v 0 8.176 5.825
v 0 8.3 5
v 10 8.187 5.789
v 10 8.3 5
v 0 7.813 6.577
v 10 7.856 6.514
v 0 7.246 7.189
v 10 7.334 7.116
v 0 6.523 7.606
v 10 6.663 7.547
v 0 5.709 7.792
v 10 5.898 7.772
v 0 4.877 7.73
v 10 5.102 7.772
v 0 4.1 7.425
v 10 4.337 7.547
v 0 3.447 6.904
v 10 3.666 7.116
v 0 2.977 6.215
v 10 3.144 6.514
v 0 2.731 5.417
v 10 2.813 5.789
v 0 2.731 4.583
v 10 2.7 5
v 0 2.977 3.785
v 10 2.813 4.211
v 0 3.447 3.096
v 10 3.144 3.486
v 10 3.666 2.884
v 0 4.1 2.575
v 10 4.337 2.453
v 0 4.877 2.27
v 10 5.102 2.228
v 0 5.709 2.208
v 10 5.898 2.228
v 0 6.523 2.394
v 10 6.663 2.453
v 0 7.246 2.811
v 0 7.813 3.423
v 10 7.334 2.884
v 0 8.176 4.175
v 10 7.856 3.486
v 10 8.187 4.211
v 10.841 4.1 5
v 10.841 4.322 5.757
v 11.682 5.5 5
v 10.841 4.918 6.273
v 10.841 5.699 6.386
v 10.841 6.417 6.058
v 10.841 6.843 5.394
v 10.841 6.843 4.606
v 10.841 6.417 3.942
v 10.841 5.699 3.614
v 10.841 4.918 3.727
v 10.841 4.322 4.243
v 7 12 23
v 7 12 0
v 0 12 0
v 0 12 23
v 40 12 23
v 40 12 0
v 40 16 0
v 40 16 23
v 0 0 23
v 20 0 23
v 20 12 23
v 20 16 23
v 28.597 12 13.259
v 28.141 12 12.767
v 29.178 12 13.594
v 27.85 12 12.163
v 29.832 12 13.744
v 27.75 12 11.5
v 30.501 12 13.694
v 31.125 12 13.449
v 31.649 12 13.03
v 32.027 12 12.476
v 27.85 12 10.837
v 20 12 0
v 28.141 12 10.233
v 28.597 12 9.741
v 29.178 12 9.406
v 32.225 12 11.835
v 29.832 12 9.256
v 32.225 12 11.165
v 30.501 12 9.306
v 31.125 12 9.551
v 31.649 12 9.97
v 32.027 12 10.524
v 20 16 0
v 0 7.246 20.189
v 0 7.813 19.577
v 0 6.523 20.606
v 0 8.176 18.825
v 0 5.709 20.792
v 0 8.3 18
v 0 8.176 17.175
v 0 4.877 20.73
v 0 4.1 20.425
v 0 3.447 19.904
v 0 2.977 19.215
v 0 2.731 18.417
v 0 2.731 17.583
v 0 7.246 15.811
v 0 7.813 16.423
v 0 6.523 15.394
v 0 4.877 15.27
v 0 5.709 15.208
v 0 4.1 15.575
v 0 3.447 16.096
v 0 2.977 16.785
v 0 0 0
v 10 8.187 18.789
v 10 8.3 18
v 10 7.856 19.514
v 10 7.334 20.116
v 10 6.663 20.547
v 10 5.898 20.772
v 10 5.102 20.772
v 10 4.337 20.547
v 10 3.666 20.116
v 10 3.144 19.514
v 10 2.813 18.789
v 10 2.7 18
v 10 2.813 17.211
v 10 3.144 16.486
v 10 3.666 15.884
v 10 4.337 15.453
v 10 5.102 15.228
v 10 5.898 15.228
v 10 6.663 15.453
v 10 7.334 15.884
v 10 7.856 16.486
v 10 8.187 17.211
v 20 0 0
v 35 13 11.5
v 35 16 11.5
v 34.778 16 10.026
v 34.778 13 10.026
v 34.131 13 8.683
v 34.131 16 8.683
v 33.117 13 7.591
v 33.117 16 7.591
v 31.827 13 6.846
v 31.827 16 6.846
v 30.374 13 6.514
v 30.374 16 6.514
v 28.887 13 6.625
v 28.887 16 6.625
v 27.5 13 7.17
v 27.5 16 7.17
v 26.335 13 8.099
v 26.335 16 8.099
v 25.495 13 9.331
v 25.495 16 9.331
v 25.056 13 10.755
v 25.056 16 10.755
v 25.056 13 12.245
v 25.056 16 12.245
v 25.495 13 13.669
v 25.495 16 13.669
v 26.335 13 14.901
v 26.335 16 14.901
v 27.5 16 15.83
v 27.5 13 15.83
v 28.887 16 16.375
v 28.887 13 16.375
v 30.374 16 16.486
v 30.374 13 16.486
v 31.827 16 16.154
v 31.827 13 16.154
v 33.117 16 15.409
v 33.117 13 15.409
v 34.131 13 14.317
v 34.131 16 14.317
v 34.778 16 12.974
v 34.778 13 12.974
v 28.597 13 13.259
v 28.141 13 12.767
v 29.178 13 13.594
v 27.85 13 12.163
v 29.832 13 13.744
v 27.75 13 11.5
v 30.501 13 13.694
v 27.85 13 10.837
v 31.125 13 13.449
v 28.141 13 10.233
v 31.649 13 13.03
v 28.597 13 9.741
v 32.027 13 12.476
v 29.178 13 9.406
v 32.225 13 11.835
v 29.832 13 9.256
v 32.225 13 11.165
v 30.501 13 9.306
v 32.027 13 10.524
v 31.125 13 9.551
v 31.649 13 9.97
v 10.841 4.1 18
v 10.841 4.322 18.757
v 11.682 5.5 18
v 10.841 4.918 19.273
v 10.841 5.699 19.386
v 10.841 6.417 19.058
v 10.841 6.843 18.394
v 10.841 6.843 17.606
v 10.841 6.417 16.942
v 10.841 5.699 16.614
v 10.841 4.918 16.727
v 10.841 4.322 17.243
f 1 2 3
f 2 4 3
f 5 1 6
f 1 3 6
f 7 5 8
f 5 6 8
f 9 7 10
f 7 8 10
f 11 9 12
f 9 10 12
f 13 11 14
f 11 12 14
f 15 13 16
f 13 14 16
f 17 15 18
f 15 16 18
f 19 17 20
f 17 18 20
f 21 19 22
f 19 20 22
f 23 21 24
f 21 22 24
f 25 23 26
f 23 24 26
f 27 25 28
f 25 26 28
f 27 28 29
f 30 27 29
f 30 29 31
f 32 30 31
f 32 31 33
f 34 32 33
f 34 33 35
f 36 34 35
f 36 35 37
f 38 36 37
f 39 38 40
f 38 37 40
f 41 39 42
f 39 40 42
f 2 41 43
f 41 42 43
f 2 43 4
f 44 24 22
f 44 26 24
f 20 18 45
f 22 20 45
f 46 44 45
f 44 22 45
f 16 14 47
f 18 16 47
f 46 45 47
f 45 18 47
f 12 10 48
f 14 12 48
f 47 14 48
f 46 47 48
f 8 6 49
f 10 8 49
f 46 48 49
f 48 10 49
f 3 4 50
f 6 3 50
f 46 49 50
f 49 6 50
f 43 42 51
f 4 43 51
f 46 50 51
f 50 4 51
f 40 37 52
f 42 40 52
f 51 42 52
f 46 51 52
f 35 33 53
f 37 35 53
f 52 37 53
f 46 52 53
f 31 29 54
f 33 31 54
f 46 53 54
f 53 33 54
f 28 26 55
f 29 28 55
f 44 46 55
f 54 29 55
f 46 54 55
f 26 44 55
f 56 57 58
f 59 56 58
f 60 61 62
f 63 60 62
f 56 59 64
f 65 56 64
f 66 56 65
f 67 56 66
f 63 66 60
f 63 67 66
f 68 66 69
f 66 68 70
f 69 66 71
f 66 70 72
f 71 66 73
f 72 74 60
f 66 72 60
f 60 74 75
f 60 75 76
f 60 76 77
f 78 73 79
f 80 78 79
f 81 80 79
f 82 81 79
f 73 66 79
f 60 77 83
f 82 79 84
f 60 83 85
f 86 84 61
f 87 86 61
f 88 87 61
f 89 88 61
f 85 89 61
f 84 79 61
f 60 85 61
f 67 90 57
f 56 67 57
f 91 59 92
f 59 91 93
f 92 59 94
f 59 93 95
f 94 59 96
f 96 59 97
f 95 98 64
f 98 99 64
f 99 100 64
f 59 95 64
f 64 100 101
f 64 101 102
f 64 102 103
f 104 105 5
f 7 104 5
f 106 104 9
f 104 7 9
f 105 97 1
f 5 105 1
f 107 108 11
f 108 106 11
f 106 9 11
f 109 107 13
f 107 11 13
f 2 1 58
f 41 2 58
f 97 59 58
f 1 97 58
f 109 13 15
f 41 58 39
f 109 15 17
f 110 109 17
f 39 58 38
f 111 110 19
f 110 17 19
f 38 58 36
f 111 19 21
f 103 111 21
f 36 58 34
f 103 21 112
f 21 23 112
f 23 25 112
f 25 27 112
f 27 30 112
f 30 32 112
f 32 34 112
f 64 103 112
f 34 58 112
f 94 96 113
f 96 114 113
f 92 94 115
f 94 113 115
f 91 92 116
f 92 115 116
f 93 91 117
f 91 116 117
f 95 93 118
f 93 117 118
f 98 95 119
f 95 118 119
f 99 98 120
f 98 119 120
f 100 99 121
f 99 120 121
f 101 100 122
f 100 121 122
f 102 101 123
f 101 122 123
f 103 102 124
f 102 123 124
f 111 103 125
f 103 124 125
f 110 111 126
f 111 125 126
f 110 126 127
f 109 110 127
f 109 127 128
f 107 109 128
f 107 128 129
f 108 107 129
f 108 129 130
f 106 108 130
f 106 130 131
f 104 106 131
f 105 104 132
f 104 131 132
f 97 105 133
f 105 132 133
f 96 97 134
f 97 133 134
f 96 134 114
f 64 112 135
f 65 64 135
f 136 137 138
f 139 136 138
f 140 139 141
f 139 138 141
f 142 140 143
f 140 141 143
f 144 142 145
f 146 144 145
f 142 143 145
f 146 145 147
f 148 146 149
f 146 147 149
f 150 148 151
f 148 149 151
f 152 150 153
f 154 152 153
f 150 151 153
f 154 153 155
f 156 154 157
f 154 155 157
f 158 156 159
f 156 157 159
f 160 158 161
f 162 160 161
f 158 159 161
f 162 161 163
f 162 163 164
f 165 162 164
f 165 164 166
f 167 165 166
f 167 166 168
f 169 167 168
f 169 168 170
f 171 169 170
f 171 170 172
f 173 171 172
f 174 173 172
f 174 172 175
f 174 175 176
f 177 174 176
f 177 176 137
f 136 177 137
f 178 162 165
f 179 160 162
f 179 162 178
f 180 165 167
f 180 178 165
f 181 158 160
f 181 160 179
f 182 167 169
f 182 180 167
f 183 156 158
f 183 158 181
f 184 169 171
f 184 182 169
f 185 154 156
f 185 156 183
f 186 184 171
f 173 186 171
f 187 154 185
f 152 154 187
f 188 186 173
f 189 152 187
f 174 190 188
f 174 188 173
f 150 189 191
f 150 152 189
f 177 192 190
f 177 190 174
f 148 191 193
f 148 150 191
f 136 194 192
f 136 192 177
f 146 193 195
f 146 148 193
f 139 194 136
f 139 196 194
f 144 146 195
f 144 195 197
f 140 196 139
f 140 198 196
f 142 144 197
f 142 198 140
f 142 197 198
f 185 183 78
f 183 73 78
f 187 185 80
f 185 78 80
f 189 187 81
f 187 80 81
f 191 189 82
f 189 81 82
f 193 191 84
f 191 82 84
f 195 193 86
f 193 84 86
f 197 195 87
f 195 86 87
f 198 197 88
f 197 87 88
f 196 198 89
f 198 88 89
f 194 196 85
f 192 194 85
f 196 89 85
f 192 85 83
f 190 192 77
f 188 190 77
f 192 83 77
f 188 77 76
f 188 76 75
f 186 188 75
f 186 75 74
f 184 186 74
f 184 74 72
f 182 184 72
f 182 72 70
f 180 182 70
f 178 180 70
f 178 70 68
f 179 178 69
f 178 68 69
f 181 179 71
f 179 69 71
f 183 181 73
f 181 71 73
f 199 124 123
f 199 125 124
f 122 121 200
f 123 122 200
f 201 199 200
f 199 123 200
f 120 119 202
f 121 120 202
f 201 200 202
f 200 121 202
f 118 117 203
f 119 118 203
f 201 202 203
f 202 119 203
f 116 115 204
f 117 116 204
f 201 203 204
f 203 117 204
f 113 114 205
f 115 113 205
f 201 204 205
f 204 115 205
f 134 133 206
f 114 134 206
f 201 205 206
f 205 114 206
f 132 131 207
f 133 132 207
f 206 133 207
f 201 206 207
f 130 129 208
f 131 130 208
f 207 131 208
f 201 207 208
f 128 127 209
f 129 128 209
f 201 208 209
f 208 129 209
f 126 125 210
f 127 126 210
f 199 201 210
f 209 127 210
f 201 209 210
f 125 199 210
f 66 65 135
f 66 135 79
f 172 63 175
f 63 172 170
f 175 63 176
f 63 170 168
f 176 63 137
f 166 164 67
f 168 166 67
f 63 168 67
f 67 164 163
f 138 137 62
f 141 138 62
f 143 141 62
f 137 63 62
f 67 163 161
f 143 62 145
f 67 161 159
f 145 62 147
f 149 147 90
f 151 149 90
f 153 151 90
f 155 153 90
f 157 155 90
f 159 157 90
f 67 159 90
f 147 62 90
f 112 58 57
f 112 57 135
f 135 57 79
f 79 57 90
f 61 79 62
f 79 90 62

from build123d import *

# Parameters (mm, degrees)
ESTRUSIONE_ESTRUSIONE1_DEPTH                         = 23
FORO_PER_VITE_M4_1_D                                 = 5.6
FORO_PER_VITE_M4_1_DEPTH                             = 10
FORO_PER_VITE_M4_1_TIP                               = 1.682409733
FORO_LAMATO_PER_BULLONE_M5_A_TESTA_ESAGO_D           = 4.5
FORO_LAMATO_PER_BULLONE_M5_A_TESTA_ESAGO_DEPTH       = 10
FORO_LAMATO_PER_BULLONE_M5_A_TESTA_ESAGO_CBORE_D     = 10
FORO_LAMATO_PER_BULLONE_M5_A_TESTA_ESAGO_CBORE_DEPTH = 3
FORO_LAMATO_PER_BULLONE_M5_A_TESTA_ESAGO_TIP         = 1.351936393


with BuildPart() as part:
    # Schizzo1 → Estrusione-Estrusione1 (new body)
    with BuildSketch(Plane.XY):
        Polygon((0, 0), (20, 0), (20, 12), (40, 12), (40, 16), (20, 16), (7, 12), (0, 12), align=None)
    extrude(amount=ESTRUSIONE_ESTRUSIONE1_DEPTH)

    # Foro per Vite M4-1
    with Locations(Plane(origin=(0, 5.5, 5), x_dir=(0, -1, 0), z_dir=(-1, 0, 0))):
        with Locations((0, 0), (0, 13)):
            Hole(FORO_PER_VITE_M4_1_D / 2, depth=FORO_PER_VITE_M4_1_DEPTH)
            with Locations((0, 0, -(FORO_PER_VITE_M4_1_DEPTH + FORO_PER_VITE_M4_1_TIP / 2))):  # 118° drill point
                Cone(0, FORO_PER_VITE_M4_1_D / 2, FORO_PER_VITE_M4_1_TIP, mode=Mode.SUBTRACT)

    # Foro lamato per Bullone M5 a testa esagonale-1
    with Locations(Plane(origin=(0, 16, 0), x_dir=(1, 0, 0), z_dir=(0, 1, 0))):
        with Locations((30, -11.5)):
            CounterBoreHole(FORO_LAMATO_PER_BULLONE_M5_A_TESTA_ESAGO_D / 2, FORO_LAMATO_PER_BULLONE_M5_A_TESTA_ESAGO_CBORE_D / 2, FORO_LAMATO_PER_BULLONE_M5_A_TESTA_ESAGO_CBORE_DEPTH, depth=FORO_LAMATO_PER_BULLONE_M5_A_TESTA_ESAGO_DEPTH)
            with Locations((0, 0, -(FORO_LAMATO_PER_BULLONE_M5_A_TESTA_ESAGO_DEPTH + FORO_LAMATO_PER_BULLONE_M5_A_TESTA_ESAGO_TIP / 2))):  # 118° drill point
                Cone(0, FORO_LAMATO_PER_BULLONE_M5_A_TESTA_ESAGO_D / 2, FORO_LAMATO_PER_BULLONE_M5_A_TESTA_ESAGO_TIP, mode=Mode.SUBTRACT)


solid = part.part
